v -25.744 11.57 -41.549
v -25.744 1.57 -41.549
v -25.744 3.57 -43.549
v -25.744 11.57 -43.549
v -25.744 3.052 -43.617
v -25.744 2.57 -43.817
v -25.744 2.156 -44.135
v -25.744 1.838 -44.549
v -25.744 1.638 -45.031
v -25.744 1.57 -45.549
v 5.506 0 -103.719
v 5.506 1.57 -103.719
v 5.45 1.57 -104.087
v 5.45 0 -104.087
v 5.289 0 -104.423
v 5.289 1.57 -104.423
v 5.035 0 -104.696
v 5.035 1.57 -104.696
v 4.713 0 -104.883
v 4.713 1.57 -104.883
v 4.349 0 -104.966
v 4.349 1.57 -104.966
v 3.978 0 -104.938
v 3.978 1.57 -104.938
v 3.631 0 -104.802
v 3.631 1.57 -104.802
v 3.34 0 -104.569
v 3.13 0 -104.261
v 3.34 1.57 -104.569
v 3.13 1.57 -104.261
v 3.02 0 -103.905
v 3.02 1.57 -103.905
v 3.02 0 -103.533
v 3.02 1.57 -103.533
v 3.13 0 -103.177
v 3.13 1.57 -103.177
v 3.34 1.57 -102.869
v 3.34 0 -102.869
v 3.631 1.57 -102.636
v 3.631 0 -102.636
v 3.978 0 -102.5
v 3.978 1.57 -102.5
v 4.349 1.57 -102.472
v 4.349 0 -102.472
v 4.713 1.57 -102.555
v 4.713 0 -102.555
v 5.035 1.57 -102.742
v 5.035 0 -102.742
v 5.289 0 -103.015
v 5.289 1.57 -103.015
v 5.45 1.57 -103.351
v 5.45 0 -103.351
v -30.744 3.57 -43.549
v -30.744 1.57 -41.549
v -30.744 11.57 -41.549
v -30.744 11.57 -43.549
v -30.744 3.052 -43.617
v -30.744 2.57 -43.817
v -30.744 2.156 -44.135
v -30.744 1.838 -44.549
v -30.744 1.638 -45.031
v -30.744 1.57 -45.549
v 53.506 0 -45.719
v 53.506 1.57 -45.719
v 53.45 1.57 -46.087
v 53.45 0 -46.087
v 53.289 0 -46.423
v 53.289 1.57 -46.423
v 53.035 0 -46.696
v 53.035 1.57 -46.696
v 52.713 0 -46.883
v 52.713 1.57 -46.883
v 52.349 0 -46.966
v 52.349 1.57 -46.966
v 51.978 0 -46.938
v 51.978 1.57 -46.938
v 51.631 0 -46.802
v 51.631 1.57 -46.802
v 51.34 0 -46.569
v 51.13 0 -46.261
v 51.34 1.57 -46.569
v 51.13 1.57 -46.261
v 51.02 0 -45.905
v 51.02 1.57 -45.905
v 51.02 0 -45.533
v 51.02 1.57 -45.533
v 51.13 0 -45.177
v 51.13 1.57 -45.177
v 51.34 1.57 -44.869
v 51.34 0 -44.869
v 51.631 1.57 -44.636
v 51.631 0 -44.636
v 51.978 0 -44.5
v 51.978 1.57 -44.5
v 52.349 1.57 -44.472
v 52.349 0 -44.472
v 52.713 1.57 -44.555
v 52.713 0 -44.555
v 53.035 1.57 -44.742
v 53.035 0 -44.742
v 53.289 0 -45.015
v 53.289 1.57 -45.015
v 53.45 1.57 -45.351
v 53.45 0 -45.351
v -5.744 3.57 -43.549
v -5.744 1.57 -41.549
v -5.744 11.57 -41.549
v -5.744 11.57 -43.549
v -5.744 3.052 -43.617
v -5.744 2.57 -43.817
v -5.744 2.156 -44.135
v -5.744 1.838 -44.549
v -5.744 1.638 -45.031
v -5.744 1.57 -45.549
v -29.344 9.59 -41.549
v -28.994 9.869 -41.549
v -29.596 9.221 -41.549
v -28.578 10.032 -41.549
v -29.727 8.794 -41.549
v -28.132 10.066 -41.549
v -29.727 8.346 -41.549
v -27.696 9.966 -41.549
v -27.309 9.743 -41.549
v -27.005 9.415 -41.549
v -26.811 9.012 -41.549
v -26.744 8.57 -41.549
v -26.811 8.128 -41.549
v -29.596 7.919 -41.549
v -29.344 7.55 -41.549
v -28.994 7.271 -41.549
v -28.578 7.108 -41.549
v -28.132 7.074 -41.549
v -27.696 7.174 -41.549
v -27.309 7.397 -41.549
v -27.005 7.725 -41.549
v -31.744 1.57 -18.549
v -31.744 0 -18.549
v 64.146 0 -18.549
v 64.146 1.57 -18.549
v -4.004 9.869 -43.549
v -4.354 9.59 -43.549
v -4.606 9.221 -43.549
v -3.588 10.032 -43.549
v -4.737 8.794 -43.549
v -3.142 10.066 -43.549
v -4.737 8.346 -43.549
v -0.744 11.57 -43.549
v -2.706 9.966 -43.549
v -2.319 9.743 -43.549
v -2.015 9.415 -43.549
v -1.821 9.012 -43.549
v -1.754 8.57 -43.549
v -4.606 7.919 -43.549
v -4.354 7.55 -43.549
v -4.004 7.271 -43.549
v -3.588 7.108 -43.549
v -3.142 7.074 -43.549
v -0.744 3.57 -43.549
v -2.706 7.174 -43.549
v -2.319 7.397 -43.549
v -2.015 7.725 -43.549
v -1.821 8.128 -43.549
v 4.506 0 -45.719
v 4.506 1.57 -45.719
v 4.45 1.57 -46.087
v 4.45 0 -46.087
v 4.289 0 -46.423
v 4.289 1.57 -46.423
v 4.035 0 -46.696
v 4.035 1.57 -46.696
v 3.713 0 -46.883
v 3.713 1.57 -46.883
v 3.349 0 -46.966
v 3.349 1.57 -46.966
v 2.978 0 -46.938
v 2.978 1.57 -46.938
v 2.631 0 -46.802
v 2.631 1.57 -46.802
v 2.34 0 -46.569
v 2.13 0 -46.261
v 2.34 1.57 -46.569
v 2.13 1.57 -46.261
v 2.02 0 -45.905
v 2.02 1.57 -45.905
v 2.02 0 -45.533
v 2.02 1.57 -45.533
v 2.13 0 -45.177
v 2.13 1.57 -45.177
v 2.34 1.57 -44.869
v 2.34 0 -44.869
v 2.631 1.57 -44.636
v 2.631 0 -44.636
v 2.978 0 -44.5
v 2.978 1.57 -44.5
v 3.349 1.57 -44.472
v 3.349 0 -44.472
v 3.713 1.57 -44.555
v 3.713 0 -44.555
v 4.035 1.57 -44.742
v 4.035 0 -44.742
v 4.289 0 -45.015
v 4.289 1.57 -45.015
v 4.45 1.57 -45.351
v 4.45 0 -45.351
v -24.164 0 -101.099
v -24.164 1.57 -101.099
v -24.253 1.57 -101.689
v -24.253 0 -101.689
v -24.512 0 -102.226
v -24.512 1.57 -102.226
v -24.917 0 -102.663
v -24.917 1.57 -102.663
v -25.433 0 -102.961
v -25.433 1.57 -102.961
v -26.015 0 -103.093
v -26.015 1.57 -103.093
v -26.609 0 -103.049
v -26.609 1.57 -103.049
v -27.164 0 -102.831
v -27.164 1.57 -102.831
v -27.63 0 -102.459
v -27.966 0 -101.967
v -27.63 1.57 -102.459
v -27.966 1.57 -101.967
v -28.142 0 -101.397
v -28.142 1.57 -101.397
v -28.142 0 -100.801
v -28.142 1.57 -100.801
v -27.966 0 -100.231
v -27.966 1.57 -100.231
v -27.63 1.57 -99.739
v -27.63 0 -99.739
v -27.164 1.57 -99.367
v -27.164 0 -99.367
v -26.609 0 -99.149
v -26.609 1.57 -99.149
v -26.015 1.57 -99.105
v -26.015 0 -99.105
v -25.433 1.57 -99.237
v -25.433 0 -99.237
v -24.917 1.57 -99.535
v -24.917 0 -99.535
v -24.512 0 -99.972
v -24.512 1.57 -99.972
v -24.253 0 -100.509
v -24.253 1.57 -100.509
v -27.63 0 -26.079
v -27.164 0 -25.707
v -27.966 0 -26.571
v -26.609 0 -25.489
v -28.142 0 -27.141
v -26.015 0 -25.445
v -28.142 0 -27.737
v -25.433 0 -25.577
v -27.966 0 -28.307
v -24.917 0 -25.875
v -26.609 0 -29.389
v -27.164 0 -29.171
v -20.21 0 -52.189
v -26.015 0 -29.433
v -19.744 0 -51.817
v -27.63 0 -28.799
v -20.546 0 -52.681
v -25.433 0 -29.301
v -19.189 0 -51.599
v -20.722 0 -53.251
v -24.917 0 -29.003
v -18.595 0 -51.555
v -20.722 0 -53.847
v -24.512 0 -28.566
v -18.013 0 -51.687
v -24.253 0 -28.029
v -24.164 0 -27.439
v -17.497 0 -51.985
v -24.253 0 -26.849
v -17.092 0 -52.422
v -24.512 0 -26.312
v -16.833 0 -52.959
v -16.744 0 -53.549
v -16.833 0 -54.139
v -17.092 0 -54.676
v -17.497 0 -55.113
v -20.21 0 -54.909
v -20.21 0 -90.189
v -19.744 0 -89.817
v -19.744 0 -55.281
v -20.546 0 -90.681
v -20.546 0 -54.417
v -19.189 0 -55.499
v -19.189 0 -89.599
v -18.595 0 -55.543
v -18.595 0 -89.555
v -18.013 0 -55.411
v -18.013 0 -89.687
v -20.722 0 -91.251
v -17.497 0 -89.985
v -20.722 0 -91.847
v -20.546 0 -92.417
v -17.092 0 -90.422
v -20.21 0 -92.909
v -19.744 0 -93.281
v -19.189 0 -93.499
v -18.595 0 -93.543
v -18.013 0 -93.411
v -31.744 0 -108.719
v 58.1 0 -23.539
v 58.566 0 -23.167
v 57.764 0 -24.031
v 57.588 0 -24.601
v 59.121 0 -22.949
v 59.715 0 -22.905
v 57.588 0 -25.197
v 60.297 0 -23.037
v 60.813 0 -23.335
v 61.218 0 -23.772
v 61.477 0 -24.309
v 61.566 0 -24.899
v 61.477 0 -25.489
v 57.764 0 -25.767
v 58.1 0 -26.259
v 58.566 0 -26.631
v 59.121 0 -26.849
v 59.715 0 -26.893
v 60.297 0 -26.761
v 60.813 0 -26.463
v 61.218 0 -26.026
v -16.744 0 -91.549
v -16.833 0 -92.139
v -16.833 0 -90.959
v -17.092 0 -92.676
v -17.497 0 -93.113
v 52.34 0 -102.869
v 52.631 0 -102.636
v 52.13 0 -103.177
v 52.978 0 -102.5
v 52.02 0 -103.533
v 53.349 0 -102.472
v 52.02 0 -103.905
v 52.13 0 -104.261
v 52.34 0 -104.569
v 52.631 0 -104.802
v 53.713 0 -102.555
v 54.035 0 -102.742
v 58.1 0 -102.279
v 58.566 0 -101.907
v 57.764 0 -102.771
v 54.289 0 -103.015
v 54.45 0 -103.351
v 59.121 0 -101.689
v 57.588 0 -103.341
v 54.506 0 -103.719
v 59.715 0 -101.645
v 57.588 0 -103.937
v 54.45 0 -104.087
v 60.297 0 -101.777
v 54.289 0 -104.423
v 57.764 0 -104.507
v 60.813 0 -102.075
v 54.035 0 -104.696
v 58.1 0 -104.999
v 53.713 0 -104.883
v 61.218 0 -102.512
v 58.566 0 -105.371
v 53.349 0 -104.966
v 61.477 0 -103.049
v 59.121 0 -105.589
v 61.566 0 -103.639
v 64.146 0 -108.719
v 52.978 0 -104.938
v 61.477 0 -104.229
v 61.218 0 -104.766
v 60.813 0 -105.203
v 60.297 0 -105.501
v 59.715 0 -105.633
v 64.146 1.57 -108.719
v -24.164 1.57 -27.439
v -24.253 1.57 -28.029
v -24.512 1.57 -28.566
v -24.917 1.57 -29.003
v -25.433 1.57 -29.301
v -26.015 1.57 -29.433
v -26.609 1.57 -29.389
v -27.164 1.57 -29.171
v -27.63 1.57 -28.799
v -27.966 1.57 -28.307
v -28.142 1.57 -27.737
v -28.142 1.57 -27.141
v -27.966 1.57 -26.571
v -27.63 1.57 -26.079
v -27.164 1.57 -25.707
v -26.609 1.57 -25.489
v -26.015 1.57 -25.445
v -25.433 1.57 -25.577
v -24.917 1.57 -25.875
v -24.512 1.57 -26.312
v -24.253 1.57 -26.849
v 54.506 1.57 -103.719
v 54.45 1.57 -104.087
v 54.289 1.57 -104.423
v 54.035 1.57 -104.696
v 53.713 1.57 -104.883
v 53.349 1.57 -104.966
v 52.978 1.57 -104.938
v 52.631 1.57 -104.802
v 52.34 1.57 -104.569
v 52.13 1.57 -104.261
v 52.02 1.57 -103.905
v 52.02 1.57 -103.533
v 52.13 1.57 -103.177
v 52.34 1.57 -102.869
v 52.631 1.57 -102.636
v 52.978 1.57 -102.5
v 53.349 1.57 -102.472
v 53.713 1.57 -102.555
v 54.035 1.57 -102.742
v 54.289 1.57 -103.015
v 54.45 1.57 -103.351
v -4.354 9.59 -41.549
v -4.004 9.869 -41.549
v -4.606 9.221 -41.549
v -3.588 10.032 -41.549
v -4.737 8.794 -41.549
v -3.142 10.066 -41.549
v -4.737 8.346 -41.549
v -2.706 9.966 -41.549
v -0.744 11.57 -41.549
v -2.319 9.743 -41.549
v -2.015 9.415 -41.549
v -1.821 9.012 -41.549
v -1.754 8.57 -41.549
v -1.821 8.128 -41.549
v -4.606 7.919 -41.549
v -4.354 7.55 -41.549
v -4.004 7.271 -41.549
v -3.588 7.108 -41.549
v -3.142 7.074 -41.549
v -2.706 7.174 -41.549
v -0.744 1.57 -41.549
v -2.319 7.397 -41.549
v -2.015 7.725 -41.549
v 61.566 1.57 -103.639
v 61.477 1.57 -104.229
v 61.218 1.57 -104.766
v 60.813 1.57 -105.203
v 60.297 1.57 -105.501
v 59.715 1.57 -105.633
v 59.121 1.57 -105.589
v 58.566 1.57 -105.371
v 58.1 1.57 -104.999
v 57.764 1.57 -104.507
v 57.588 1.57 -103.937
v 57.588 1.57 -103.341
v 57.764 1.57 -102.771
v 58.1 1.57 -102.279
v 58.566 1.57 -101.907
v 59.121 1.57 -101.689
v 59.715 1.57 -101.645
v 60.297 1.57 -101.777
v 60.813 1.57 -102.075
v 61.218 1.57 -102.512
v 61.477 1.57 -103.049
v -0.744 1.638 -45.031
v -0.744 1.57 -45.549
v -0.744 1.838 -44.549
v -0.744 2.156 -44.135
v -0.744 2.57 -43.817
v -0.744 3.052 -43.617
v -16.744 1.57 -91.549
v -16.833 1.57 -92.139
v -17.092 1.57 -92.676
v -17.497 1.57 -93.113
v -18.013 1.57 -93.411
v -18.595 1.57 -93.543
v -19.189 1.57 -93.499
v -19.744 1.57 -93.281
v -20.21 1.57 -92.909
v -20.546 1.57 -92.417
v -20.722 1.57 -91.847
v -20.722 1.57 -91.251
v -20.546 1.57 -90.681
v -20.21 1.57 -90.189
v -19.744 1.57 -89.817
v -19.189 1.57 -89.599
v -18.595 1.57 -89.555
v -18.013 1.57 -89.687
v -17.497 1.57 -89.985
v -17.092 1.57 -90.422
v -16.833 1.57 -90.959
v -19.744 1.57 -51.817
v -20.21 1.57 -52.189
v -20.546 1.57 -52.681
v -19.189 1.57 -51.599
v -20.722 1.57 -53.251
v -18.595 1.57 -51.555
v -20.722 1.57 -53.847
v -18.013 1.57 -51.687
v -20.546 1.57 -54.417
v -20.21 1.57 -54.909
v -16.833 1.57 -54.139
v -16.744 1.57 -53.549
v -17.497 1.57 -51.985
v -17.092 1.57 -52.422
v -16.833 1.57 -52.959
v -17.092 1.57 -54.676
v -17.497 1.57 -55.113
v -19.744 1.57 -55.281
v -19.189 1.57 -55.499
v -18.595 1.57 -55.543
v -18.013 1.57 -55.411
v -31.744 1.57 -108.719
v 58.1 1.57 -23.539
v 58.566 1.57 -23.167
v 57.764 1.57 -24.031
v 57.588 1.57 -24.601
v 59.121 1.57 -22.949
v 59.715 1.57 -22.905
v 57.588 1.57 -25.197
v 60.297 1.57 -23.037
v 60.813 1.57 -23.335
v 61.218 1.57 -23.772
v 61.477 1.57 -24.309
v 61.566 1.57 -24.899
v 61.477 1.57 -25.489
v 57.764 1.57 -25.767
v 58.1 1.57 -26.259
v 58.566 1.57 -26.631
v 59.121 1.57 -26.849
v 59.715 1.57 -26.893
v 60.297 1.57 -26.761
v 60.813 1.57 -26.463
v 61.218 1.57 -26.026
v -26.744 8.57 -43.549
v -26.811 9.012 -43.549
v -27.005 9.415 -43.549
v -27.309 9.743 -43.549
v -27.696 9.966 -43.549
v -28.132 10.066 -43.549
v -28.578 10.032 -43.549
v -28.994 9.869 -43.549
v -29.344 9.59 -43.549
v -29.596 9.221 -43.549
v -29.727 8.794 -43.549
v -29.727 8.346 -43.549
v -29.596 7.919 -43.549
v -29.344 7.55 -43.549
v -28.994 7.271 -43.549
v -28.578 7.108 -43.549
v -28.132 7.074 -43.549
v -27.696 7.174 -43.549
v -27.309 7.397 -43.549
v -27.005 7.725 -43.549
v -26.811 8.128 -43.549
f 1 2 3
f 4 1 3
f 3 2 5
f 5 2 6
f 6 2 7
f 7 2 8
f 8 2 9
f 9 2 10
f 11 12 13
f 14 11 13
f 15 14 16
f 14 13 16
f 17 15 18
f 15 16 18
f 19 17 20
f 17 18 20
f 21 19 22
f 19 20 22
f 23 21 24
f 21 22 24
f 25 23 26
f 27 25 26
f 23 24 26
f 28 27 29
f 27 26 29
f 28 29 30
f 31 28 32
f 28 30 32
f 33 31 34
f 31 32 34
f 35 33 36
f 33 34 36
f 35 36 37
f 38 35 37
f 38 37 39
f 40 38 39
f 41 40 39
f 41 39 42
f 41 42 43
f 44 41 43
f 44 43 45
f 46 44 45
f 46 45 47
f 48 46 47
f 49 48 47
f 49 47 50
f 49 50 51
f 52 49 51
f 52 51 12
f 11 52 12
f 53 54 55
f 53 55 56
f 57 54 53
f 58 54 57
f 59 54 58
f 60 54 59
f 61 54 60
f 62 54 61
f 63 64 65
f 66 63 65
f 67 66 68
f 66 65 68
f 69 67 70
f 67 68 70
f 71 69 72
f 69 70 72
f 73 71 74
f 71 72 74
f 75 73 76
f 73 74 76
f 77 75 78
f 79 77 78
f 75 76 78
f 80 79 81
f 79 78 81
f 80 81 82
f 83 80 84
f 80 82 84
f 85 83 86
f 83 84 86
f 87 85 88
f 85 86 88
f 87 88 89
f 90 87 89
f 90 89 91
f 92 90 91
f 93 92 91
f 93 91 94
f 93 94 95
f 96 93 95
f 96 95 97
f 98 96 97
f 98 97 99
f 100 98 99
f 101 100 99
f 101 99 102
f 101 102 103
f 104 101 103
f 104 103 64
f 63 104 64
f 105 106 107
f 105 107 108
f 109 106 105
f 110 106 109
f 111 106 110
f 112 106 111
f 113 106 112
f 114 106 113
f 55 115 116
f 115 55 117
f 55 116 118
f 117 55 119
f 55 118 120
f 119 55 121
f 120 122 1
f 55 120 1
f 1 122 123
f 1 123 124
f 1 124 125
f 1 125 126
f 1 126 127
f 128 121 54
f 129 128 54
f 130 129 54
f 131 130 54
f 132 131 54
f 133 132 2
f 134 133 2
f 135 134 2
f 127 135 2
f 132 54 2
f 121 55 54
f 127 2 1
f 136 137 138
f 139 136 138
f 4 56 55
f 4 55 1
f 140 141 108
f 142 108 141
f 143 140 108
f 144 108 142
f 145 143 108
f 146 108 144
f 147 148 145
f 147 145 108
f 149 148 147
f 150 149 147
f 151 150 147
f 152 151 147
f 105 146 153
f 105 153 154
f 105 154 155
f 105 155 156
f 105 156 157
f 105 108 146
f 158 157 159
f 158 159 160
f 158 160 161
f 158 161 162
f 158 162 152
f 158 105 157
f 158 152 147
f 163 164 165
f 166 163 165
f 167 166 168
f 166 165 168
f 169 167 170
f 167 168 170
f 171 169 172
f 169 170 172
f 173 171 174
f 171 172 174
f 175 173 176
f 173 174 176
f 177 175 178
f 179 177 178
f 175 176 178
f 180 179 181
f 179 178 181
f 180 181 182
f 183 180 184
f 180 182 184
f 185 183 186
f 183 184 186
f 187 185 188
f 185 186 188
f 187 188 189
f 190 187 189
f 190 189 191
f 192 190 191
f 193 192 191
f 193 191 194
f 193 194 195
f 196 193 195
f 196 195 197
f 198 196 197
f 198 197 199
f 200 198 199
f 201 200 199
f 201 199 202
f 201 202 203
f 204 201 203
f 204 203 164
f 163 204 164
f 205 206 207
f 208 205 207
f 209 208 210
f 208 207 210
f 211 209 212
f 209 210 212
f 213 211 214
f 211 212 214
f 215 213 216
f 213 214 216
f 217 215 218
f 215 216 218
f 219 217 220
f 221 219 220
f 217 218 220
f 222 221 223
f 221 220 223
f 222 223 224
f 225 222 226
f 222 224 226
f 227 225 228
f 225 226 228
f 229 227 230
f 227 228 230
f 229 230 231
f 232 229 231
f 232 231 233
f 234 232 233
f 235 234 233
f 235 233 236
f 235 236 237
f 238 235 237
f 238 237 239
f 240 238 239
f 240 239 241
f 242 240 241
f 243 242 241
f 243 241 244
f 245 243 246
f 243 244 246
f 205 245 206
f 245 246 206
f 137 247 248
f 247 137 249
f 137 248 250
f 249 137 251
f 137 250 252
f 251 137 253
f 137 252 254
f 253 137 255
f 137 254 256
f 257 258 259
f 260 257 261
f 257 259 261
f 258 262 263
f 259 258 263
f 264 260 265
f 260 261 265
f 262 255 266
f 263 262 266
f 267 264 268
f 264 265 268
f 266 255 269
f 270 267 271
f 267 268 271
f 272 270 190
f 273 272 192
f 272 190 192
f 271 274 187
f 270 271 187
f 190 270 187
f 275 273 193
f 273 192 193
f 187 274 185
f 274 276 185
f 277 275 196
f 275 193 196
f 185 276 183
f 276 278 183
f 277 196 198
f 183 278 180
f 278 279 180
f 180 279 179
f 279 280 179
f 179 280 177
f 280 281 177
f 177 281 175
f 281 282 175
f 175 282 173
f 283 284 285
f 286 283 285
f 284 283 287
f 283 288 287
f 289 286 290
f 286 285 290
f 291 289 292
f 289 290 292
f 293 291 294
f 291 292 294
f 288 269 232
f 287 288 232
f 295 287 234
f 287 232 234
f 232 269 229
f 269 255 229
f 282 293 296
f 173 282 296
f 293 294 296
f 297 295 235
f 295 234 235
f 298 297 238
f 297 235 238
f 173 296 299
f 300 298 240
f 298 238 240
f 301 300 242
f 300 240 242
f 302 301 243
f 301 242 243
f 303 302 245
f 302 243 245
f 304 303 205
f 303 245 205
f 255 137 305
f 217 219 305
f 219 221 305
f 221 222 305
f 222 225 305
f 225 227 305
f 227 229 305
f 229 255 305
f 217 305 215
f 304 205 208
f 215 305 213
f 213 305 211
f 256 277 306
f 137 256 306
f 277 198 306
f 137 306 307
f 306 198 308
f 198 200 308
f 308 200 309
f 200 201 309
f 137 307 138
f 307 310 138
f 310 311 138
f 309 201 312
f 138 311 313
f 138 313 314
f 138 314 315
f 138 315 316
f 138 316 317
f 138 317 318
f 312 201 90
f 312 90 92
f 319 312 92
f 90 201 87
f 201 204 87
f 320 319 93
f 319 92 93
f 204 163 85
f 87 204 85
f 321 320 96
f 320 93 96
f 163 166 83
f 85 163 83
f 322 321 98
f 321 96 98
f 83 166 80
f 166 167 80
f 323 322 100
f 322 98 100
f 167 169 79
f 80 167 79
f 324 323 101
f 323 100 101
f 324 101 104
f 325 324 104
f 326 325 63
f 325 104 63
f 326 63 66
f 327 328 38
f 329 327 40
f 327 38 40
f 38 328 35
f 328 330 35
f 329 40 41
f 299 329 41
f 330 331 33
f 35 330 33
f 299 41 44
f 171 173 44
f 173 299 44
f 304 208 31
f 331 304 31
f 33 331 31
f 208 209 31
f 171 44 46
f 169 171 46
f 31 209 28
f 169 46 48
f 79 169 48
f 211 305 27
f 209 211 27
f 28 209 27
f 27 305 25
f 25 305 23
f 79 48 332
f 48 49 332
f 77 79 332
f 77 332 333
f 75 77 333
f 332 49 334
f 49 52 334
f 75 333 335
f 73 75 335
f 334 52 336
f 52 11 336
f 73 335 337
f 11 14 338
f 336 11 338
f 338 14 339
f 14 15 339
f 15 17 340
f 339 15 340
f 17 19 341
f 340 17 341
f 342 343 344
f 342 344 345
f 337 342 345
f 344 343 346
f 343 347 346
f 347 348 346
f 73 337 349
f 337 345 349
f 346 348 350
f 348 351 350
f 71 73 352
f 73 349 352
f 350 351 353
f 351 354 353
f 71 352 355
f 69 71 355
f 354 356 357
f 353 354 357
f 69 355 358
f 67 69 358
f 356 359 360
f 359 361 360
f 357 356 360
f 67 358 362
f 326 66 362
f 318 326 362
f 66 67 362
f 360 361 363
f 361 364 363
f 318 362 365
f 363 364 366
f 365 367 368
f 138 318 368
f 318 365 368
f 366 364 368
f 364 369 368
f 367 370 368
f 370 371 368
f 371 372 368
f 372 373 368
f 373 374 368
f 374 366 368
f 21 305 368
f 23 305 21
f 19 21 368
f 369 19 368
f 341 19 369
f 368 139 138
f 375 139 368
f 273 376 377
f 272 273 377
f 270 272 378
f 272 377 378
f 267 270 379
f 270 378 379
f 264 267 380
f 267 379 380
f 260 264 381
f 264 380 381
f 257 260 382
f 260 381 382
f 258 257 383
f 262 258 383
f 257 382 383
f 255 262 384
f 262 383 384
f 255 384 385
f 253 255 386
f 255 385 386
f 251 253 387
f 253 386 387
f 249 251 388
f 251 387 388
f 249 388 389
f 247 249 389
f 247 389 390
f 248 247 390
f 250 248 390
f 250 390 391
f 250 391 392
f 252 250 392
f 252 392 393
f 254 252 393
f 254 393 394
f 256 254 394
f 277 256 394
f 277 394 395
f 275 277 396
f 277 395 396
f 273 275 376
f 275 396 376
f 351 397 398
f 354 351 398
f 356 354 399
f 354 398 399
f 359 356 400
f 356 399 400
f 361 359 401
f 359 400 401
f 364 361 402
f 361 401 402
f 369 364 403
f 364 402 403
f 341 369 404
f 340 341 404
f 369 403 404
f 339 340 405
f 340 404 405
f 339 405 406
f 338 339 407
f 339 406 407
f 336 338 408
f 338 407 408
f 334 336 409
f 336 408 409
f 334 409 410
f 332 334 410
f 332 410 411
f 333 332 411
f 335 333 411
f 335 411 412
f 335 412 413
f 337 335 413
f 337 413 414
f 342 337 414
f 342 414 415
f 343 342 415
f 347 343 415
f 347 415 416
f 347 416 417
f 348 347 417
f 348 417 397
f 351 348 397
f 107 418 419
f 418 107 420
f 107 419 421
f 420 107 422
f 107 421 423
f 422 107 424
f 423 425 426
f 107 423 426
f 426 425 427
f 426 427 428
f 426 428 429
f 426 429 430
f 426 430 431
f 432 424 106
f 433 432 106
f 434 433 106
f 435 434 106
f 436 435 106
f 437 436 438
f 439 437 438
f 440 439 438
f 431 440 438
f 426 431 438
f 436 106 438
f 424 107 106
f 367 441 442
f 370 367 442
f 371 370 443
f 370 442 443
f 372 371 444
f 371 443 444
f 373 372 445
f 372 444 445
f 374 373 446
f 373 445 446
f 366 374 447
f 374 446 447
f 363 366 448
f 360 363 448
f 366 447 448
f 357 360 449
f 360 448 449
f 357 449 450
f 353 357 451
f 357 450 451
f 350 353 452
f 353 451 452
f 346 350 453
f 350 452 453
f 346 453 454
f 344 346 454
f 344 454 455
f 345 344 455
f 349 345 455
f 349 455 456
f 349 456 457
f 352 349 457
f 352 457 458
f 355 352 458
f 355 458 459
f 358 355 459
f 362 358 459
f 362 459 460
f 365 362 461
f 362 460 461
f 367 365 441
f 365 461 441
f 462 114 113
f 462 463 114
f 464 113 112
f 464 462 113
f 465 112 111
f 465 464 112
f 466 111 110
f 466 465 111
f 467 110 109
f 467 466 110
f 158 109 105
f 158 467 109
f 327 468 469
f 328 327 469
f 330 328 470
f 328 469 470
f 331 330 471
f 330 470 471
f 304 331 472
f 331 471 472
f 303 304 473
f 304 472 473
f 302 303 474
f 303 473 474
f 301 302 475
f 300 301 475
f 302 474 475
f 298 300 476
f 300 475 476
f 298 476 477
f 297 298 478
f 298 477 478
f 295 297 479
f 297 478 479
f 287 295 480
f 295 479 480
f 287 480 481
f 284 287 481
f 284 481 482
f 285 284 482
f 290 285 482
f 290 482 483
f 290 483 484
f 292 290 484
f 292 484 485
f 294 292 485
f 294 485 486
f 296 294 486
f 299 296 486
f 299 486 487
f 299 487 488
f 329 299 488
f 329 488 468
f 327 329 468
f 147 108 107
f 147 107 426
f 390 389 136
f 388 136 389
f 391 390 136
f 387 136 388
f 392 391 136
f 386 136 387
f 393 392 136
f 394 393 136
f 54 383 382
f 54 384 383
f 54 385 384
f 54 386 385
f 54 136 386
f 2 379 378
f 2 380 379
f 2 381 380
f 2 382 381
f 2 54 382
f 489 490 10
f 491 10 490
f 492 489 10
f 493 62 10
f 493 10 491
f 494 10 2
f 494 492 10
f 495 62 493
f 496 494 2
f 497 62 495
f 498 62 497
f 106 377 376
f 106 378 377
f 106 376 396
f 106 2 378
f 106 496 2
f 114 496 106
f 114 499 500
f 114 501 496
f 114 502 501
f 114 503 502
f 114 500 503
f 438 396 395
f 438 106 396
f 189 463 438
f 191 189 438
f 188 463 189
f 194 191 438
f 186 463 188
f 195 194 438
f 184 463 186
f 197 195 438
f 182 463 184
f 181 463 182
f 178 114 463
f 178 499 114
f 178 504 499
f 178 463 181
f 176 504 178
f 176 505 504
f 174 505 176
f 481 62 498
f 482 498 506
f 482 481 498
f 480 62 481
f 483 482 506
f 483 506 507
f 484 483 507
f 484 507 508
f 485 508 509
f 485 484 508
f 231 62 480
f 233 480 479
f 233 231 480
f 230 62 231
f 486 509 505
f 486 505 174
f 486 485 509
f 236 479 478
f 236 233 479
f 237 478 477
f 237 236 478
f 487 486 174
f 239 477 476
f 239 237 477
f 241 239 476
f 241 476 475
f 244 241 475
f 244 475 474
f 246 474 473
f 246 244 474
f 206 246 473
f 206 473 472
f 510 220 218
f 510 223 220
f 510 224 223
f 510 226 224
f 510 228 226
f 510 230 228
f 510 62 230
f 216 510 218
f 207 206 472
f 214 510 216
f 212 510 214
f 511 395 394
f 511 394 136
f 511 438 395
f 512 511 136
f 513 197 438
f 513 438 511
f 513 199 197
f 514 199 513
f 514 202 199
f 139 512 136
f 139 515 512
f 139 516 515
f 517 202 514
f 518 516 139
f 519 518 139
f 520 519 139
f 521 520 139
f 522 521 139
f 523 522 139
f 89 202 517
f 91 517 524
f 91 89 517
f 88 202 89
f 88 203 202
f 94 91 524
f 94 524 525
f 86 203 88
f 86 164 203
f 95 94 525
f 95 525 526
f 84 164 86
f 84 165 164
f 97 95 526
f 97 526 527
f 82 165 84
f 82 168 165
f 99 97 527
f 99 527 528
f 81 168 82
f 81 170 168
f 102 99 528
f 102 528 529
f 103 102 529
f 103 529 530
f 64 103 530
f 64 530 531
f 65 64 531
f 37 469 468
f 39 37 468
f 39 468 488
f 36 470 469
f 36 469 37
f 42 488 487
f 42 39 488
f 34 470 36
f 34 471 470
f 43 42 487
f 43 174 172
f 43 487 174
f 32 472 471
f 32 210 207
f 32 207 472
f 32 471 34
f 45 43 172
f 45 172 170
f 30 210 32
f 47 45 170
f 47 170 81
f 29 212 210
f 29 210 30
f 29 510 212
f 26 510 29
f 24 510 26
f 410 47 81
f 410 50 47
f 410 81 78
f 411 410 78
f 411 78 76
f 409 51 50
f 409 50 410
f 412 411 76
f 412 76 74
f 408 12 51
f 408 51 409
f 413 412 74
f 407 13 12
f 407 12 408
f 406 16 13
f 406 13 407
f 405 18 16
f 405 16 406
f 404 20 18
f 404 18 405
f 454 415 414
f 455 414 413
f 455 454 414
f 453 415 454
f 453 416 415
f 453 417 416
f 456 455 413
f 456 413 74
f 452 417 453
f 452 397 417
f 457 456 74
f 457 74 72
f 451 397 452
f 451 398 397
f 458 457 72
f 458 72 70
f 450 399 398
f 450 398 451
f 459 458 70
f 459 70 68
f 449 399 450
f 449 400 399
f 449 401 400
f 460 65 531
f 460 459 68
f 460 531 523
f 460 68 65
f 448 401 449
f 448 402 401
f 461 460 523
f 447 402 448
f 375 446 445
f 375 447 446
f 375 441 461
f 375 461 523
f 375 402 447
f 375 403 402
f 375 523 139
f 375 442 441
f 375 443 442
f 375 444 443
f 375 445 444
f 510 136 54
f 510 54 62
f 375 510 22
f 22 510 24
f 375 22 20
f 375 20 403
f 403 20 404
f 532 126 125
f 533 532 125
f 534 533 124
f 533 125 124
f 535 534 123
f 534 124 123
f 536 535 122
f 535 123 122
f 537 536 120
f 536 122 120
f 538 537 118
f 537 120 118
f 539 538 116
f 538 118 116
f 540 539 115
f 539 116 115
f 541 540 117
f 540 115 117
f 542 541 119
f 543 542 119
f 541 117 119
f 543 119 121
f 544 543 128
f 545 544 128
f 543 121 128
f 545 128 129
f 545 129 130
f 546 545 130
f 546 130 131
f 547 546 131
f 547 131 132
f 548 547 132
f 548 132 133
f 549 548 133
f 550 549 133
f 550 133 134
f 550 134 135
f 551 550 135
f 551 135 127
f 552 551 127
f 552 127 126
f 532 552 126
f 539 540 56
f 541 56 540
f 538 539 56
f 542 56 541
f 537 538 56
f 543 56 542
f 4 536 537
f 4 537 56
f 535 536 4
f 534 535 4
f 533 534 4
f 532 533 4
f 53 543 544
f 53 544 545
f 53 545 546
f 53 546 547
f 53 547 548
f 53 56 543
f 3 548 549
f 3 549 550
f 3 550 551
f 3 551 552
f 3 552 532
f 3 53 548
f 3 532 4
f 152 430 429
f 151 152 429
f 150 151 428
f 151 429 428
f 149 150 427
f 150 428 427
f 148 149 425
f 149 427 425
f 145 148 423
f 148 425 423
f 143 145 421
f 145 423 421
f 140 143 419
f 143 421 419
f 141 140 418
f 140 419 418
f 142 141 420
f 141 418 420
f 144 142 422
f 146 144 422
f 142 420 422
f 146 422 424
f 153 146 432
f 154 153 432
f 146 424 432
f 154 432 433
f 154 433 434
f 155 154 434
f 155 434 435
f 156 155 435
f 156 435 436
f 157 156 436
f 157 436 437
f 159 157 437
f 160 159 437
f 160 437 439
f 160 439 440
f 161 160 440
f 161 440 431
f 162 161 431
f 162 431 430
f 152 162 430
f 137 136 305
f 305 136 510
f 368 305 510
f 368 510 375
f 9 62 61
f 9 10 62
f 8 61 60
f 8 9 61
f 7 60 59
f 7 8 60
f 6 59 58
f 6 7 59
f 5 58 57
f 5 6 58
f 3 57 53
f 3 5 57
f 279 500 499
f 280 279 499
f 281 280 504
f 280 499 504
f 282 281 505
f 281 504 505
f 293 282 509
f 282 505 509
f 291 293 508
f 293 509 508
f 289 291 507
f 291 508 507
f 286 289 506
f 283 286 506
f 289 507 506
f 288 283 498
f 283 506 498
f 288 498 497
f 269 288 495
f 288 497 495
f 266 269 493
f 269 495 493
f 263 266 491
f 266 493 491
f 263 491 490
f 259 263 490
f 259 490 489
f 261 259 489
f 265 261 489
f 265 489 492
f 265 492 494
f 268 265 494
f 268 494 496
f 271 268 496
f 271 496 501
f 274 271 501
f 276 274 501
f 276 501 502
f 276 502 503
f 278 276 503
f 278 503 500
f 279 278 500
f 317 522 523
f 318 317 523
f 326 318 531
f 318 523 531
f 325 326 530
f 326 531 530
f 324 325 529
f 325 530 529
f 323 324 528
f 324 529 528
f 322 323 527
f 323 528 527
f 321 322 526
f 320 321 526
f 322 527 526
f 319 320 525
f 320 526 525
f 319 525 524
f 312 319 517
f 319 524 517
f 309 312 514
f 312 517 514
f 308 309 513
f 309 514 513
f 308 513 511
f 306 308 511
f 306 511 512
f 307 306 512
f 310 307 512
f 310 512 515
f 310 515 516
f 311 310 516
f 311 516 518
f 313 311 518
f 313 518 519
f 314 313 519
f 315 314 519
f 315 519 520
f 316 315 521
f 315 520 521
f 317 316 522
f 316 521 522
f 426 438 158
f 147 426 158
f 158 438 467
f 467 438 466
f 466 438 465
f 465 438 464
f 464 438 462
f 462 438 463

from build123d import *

# Parameters (mm, degrees)
SKETCH1_W               = 96.89
SKETCH1_H               = 90.17
PCB_DEPTH               = 1.57
SKETCH2_R               = 2
M3_MOUNTING_HOLES_DEPTH = 1.57
SKETCH5_W               = 0.5
SKETCH5_H               = 90.17
CUT_EXTRUDE1_DEPTH      = 2.57
SKETCH8_R               = 1.25
RPI_MOUNTING_HOLE_DEPTH = 10
SKETCH9_R               = 2
POWERADAPTERHOLES_DEPTH = 10
SKETCH10_W              = 5
SKETCH10_H              = 2
DSUB_HOLDER_DEPTH       = 10
FILLET2_R               = 2
DSUB_FIELDS_REACH       = 69.17
SKETCH11_R              = 1.5


with BuildPart() as part:
    # Sketch1 → PCB (new body)
    with BuildSketch(Plane(origin=(0, 0, 0), x_dir=(1, 0, 0), z_dir=(0, 1, 0))):
        with Locations((16.200949951, 63.633996534)):
            Rectangle(SKETCH1_W, SKETCH1_H)
    extrude(amount=PCB_DEPTH)

    # Sketch2 → M3 Mounting Holes (cut)
    with BuildSketch(Plane(origin=(0, 1.57, 0), x_dir=(1, 0, 0), z_dir=(0, 1, 0))):
        with Locations((59.565949951, 24.898996534)):
            Circle(SKETCH2_R)
        with Locations((-26.164050049, 27.438996534)):
            Circle(SKETCH2_R)
        with Locations((-26.164050049, 101.098996534)):
            Circle(SKETCH2_R)
        with Locations((59.565949951, 103.638996534)):
            Circle(SKETCH2_R)
    extrude(amount=-M3_MOUNTING_HOLES_DEPTH, mode=Mode.SUBTRACT)

    # Sketch5 → Cut-Extrude1 (cut, through all)
    with BuildSketch(Plane(origin=(0, 1.57, 0), x_dir=(1, 0, 0), z_dir=(0, 1, 0))):
        with Locations((-31.994050049, 63.633996534)):
            Rectangle(SKETCH5_W, SKETCH5_H)
        with Locations((64.395949951, 63.633996534)):
            Rectangle(SKETCH5_W, SKETCH5_H)
    extrude(amount=-CUT_EXTRUDE1_DEPTH, mode=Mode.SUBTRACT)

    # Sketch8 → RPi mounting hole (cut)
    with BuildSketch(Plane(origin=(0, 1.57, 0), x_dir=(1, 0, 0), z_dir=(0, 1, 0))):
        with Locations((3.255949951, 45.718996534)):
            Circle(SKETCH8_R)
        with Locations((52.255949951, 45.718996534)):
            Circle(SKETCH8_R)
        with Locations((4.255949951, 103.718996534)):
            Circle(SKETCH8_R)
        with Locations((53.255949951, 103.718996534)):
            Circle(SKETCH8_R)
    extrude(amount=-RPI_MOUNTING_HOLE_DEPTH, mode=Mode.SUBTRACT)

    # Sketch9 → PowerAdapterHoles (cut)
    with BuildSketch(Plane(origin=(0, 1.57, 0), x_dir=(1, 0, 0), z_dir=(0, 1, 0))):
        with Locations((-18.744050049, 91.548996534)):
            Circle(SKETCH9_R)
        with Locations((-18.744050049, 53.548996534)):
            Circle(SKETCH9_R)
    extrude(amount=-POWERADAPTERHOLES_DEPTH, mode=Mode.SUBTRACT)

    # Sketch10 → DSub Holder (add)
    with BuildSketch(Plane(origin=(0, 1.57, 0), x_dir=(1, 0, 0), z_dir=(0, 1, 0))):
        with Locations((-28.244050049, 42.548996534)):
            Rectangle(SKETCH10_W, SKETCH10_H)
        with Locations((-3.244050049, 42.548996534)):
            Rectangle(SKETCH10_W, SKETCH10_H)
    extrude(amount=DSUB_HOLDER_DEPTH)

    # Fillet2
    fillet2_edges = [part.edges().sort_by_distance(p)[0] for p in [
        (-3.244050049, 1.57, -43.548996534),
        (-28.244050049, 1.57, -43.548996534),
    ]]
    fillet(fillet2_edges, radius=FILLET2_R)

    # Sketch11 → DSub Fields (cut, up to next)
    with BuildSketch(Plane.XY.offset(-41.548996534), mode=Mode.PRIVATE) as dsub_fields_sk1:
        with Locations((-28.244050049, 8.57)):
            Circle(SKETCH11_R)
    dsub_fields_tool1 = extrude(dsub_fields_sk1.sketch, amount=-DSUB_FIELDS_REACH, mode=Mode.PRIVATE) & part.part
    add(dsub_fields_tool1.solids().sort_by_distance((-28.24405, 8.57, -41.548997))[0], mode=Mode.SUBTRACT)
    # Sketch11 → DSub Fields (cut, up to next)
    with BuildSketch(Plane.XY.offset(-41.548996534), mode=Mode.PRIVATE) as dsub_fields_sk2:
        with Locations((-3.254050049, 8.57)):
            Circle(SKETCH11_R)
    dsub_fields_tool2 = extrude(dsub_fields_sk2.sketch, amount=-DSUB_FIELDS_REACH, mode=Mode.PRIVATE) & part.part
    add(dsub_fields_tool2.solids().sort_by_distance((-3.25405, 8.57, -41.548997))[0], mode=Mode.SUBTRACT)


solid = part.part
